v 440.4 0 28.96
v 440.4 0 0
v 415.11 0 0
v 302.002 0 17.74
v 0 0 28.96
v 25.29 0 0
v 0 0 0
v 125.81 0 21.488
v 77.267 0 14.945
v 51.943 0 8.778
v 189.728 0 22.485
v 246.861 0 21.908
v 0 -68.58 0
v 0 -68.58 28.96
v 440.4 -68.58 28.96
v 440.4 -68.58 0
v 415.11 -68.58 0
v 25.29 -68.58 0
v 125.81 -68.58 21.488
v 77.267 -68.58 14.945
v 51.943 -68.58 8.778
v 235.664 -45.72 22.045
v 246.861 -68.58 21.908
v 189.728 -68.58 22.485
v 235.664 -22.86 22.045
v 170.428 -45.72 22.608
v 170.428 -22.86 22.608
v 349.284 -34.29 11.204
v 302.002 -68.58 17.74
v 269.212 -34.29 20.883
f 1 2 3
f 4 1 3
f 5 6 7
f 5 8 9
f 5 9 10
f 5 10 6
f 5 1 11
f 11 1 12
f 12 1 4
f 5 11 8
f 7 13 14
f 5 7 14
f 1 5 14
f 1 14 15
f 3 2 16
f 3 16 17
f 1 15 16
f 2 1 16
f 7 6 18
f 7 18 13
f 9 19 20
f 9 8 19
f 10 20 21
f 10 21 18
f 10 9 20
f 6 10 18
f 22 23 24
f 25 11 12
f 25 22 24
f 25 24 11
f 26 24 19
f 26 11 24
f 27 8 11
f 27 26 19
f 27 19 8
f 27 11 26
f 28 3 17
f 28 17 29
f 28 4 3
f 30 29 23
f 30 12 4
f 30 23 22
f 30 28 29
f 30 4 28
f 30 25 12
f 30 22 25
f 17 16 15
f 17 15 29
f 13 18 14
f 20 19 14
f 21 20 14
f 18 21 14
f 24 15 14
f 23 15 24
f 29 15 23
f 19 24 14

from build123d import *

# Parameters (mm, degrees)
BAR_DEPTH = 68.58


with BuildPart() as part:
    # Sketch → Bar (new body)
    with BuildSketch(Plane.XZ):
        with BuildLine():
            Line((25.29, 0), (0, 0))
            Line((0, 0), (0, 28.96))
            Line((0, 28.96), (440.4, 28.96))
            Line((440.4, 28.96), (440.4, 0))
            Line((440.4, 0), (415.11, 0))
            add(Edge.make_bspline(
                [(415.11, 0), (296.03, 21.75), (222.34, 21.99), (191.75, 22.68), (86.07, 22.85), (25.29, 0)],
                knots=[0, 0, 0, 0, 0.333333, 0.666667, 1, 1, 1, 1], degree=3))
        make_face()
    extrude(amount=BAR_DEPTH)


solid = part.part
